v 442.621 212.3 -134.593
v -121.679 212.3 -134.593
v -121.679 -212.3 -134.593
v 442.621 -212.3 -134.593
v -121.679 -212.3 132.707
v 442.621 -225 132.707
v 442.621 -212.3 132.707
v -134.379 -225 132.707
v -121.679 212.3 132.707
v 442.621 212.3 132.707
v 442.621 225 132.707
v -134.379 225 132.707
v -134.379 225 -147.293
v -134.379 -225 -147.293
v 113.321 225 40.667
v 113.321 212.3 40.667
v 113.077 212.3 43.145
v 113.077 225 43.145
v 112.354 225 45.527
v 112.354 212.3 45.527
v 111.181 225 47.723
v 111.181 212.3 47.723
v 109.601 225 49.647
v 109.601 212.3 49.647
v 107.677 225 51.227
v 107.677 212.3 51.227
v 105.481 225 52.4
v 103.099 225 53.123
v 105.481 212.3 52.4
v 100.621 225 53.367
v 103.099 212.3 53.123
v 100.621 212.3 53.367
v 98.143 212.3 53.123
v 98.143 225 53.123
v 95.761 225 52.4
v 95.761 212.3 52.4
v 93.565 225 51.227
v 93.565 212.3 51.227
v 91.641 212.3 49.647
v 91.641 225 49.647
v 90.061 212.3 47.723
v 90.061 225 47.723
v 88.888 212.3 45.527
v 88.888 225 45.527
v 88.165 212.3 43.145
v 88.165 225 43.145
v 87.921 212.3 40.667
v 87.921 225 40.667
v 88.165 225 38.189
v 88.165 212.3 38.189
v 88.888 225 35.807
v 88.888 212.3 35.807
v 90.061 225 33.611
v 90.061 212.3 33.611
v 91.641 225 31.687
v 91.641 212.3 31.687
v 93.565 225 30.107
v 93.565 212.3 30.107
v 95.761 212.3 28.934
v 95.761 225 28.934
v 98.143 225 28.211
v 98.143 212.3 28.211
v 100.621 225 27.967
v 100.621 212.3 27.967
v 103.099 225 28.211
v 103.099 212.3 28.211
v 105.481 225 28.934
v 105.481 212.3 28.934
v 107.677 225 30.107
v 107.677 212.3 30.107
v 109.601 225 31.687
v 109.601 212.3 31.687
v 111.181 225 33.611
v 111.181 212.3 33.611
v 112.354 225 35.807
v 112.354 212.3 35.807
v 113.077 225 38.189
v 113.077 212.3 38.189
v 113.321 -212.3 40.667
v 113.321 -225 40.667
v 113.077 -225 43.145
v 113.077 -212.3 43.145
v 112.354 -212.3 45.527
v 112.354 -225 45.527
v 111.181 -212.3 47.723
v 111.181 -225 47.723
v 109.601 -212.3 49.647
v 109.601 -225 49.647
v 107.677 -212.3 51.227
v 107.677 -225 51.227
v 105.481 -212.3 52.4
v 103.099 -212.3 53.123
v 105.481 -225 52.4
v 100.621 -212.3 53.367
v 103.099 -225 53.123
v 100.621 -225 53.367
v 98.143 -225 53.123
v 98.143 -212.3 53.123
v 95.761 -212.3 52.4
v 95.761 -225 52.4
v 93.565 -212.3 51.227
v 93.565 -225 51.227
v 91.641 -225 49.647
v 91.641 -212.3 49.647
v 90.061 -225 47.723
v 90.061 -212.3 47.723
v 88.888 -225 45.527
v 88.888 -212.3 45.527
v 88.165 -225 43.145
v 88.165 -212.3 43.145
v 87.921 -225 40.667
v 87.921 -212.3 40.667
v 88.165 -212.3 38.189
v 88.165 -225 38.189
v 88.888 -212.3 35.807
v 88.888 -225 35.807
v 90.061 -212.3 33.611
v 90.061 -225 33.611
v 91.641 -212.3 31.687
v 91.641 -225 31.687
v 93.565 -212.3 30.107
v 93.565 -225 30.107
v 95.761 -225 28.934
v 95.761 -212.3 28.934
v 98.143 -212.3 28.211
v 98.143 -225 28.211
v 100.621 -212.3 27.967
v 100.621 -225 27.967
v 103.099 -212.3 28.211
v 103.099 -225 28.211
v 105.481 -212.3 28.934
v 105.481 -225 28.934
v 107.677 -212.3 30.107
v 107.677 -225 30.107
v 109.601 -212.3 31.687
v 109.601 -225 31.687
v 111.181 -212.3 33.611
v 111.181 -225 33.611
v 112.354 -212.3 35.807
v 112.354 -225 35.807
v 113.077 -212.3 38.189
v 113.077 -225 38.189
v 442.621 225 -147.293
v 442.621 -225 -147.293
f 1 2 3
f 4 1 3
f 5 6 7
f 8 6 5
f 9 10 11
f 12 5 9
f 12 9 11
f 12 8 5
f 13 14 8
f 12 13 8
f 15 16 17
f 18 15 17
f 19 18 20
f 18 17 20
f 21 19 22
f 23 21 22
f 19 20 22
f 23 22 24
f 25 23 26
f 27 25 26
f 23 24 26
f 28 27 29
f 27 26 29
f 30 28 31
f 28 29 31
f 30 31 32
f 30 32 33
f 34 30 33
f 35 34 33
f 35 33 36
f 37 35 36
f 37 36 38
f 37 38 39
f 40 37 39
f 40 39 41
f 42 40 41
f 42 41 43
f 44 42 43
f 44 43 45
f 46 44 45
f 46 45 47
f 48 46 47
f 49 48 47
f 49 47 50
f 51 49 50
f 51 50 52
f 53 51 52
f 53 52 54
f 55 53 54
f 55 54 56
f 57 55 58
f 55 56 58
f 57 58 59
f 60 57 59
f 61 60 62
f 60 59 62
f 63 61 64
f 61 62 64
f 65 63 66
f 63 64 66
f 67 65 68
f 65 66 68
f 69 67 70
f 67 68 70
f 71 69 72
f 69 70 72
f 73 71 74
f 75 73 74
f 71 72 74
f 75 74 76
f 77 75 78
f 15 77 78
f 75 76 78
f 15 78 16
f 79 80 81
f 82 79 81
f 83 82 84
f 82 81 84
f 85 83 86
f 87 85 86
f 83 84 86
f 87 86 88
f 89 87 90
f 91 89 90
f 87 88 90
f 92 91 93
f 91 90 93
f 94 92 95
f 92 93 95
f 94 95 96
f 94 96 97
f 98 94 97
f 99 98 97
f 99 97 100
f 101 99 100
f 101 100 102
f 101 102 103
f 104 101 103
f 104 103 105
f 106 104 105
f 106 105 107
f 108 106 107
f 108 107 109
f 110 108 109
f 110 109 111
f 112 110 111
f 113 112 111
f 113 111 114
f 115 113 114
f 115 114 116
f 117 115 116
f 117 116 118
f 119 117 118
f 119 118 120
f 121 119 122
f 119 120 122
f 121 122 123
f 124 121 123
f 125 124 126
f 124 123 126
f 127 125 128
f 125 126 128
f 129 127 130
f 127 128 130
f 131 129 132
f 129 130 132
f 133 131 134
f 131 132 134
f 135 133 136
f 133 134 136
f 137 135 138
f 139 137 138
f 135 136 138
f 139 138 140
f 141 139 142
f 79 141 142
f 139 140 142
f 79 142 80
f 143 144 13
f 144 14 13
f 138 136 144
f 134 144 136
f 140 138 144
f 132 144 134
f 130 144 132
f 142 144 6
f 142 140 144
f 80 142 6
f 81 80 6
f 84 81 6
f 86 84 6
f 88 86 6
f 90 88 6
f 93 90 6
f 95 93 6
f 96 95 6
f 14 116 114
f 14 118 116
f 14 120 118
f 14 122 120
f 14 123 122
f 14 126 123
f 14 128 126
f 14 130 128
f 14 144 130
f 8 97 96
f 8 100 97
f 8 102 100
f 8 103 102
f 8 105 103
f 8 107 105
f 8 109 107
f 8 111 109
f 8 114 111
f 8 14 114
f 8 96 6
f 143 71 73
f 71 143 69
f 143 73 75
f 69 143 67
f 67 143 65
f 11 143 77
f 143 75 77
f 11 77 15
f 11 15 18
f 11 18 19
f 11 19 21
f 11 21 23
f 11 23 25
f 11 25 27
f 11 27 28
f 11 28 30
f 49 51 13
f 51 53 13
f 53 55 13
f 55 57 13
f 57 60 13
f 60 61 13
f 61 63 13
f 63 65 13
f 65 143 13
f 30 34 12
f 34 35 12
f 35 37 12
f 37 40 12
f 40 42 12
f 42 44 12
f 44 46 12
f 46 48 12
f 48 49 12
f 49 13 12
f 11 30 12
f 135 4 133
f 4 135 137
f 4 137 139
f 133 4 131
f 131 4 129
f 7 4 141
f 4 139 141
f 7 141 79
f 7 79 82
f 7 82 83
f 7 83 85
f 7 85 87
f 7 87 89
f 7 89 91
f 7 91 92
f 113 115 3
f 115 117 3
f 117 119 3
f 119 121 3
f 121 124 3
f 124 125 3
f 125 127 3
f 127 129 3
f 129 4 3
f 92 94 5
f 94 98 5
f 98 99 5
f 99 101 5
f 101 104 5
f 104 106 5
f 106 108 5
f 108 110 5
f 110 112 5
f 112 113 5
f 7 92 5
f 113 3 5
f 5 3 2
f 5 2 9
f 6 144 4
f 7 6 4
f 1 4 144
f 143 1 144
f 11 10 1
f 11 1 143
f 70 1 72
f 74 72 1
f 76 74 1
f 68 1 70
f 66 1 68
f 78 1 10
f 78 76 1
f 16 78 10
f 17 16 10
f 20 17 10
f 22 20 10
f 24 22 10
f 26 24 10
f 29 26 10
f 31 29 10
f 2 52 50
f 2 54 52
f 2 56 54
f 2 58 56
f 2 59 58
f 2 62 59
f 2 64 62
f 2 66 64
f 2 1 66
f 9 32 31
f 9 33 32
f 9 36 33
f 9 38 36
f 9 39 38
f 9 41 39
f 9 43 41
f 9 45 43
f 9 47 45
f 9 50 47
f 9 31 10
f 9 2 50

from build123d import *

# Parameters (mm, degrees)
F0_W     = 450
F0_H     = 280
F1_DEPTH = 225
F2_T     = -12.7
F3_R     = 12.7
F4_DEPTH = 450.001
F5_W     = 450
F5_H     = 280
F6_DEPTH = 127
F7_W     = 424.6
F7_H     = 267.3
F8_DEPTH = 139.701


with BuildPart() as f1:
    # F0 (on Front) → F1 (new body, symmetric)
    with BuildSketch(Plane.XZ):
        with Locations((90.62104, -7.292895)):
            Rectangle(F0_W, F0_H)
    extrude(amount=F1_DEPTH, both=True)

    # F2
    f2_openings = [f1.faces().sort_by_distance(p)[0] for p in [
        (90.62104, 0, 132.707105),
    ]]
    offset(amount=F2_T, openings=f2_openings)

    # F3 (on face) → F4 (cut, through all)
    with BuildSketch(Plane.XZ.offset(225)):
        with Locations((100.62104, 40.667105)):
            Circle(F3_R)
    extrude(amount=-F4_DEPTH, mode=Mode.SUBTRACT)

    # F5 (on face) → F6 (join)
    with BuildSketch(Plane.YZ.offset(315.62104)):
        with Locations((0, -7.292895)):
            Rectangle(F5_W, F5_H)
    extrude(amount=F6_DEPTH)

    # F7 (on face) → F8 (cut, through all)
    with BuildSketch(Plane(origin=(302.92104, 0, 0), x_dir=(0, -1, 0), z_dir=(-1, 0, 0))):
        with Locations((0, -0.942895)):
            Rectangle(F7_W, F7_H)
    extrude(amount=-F8_DEPTH, mode=Mode.SUBTRACT)


solid = f1.part
